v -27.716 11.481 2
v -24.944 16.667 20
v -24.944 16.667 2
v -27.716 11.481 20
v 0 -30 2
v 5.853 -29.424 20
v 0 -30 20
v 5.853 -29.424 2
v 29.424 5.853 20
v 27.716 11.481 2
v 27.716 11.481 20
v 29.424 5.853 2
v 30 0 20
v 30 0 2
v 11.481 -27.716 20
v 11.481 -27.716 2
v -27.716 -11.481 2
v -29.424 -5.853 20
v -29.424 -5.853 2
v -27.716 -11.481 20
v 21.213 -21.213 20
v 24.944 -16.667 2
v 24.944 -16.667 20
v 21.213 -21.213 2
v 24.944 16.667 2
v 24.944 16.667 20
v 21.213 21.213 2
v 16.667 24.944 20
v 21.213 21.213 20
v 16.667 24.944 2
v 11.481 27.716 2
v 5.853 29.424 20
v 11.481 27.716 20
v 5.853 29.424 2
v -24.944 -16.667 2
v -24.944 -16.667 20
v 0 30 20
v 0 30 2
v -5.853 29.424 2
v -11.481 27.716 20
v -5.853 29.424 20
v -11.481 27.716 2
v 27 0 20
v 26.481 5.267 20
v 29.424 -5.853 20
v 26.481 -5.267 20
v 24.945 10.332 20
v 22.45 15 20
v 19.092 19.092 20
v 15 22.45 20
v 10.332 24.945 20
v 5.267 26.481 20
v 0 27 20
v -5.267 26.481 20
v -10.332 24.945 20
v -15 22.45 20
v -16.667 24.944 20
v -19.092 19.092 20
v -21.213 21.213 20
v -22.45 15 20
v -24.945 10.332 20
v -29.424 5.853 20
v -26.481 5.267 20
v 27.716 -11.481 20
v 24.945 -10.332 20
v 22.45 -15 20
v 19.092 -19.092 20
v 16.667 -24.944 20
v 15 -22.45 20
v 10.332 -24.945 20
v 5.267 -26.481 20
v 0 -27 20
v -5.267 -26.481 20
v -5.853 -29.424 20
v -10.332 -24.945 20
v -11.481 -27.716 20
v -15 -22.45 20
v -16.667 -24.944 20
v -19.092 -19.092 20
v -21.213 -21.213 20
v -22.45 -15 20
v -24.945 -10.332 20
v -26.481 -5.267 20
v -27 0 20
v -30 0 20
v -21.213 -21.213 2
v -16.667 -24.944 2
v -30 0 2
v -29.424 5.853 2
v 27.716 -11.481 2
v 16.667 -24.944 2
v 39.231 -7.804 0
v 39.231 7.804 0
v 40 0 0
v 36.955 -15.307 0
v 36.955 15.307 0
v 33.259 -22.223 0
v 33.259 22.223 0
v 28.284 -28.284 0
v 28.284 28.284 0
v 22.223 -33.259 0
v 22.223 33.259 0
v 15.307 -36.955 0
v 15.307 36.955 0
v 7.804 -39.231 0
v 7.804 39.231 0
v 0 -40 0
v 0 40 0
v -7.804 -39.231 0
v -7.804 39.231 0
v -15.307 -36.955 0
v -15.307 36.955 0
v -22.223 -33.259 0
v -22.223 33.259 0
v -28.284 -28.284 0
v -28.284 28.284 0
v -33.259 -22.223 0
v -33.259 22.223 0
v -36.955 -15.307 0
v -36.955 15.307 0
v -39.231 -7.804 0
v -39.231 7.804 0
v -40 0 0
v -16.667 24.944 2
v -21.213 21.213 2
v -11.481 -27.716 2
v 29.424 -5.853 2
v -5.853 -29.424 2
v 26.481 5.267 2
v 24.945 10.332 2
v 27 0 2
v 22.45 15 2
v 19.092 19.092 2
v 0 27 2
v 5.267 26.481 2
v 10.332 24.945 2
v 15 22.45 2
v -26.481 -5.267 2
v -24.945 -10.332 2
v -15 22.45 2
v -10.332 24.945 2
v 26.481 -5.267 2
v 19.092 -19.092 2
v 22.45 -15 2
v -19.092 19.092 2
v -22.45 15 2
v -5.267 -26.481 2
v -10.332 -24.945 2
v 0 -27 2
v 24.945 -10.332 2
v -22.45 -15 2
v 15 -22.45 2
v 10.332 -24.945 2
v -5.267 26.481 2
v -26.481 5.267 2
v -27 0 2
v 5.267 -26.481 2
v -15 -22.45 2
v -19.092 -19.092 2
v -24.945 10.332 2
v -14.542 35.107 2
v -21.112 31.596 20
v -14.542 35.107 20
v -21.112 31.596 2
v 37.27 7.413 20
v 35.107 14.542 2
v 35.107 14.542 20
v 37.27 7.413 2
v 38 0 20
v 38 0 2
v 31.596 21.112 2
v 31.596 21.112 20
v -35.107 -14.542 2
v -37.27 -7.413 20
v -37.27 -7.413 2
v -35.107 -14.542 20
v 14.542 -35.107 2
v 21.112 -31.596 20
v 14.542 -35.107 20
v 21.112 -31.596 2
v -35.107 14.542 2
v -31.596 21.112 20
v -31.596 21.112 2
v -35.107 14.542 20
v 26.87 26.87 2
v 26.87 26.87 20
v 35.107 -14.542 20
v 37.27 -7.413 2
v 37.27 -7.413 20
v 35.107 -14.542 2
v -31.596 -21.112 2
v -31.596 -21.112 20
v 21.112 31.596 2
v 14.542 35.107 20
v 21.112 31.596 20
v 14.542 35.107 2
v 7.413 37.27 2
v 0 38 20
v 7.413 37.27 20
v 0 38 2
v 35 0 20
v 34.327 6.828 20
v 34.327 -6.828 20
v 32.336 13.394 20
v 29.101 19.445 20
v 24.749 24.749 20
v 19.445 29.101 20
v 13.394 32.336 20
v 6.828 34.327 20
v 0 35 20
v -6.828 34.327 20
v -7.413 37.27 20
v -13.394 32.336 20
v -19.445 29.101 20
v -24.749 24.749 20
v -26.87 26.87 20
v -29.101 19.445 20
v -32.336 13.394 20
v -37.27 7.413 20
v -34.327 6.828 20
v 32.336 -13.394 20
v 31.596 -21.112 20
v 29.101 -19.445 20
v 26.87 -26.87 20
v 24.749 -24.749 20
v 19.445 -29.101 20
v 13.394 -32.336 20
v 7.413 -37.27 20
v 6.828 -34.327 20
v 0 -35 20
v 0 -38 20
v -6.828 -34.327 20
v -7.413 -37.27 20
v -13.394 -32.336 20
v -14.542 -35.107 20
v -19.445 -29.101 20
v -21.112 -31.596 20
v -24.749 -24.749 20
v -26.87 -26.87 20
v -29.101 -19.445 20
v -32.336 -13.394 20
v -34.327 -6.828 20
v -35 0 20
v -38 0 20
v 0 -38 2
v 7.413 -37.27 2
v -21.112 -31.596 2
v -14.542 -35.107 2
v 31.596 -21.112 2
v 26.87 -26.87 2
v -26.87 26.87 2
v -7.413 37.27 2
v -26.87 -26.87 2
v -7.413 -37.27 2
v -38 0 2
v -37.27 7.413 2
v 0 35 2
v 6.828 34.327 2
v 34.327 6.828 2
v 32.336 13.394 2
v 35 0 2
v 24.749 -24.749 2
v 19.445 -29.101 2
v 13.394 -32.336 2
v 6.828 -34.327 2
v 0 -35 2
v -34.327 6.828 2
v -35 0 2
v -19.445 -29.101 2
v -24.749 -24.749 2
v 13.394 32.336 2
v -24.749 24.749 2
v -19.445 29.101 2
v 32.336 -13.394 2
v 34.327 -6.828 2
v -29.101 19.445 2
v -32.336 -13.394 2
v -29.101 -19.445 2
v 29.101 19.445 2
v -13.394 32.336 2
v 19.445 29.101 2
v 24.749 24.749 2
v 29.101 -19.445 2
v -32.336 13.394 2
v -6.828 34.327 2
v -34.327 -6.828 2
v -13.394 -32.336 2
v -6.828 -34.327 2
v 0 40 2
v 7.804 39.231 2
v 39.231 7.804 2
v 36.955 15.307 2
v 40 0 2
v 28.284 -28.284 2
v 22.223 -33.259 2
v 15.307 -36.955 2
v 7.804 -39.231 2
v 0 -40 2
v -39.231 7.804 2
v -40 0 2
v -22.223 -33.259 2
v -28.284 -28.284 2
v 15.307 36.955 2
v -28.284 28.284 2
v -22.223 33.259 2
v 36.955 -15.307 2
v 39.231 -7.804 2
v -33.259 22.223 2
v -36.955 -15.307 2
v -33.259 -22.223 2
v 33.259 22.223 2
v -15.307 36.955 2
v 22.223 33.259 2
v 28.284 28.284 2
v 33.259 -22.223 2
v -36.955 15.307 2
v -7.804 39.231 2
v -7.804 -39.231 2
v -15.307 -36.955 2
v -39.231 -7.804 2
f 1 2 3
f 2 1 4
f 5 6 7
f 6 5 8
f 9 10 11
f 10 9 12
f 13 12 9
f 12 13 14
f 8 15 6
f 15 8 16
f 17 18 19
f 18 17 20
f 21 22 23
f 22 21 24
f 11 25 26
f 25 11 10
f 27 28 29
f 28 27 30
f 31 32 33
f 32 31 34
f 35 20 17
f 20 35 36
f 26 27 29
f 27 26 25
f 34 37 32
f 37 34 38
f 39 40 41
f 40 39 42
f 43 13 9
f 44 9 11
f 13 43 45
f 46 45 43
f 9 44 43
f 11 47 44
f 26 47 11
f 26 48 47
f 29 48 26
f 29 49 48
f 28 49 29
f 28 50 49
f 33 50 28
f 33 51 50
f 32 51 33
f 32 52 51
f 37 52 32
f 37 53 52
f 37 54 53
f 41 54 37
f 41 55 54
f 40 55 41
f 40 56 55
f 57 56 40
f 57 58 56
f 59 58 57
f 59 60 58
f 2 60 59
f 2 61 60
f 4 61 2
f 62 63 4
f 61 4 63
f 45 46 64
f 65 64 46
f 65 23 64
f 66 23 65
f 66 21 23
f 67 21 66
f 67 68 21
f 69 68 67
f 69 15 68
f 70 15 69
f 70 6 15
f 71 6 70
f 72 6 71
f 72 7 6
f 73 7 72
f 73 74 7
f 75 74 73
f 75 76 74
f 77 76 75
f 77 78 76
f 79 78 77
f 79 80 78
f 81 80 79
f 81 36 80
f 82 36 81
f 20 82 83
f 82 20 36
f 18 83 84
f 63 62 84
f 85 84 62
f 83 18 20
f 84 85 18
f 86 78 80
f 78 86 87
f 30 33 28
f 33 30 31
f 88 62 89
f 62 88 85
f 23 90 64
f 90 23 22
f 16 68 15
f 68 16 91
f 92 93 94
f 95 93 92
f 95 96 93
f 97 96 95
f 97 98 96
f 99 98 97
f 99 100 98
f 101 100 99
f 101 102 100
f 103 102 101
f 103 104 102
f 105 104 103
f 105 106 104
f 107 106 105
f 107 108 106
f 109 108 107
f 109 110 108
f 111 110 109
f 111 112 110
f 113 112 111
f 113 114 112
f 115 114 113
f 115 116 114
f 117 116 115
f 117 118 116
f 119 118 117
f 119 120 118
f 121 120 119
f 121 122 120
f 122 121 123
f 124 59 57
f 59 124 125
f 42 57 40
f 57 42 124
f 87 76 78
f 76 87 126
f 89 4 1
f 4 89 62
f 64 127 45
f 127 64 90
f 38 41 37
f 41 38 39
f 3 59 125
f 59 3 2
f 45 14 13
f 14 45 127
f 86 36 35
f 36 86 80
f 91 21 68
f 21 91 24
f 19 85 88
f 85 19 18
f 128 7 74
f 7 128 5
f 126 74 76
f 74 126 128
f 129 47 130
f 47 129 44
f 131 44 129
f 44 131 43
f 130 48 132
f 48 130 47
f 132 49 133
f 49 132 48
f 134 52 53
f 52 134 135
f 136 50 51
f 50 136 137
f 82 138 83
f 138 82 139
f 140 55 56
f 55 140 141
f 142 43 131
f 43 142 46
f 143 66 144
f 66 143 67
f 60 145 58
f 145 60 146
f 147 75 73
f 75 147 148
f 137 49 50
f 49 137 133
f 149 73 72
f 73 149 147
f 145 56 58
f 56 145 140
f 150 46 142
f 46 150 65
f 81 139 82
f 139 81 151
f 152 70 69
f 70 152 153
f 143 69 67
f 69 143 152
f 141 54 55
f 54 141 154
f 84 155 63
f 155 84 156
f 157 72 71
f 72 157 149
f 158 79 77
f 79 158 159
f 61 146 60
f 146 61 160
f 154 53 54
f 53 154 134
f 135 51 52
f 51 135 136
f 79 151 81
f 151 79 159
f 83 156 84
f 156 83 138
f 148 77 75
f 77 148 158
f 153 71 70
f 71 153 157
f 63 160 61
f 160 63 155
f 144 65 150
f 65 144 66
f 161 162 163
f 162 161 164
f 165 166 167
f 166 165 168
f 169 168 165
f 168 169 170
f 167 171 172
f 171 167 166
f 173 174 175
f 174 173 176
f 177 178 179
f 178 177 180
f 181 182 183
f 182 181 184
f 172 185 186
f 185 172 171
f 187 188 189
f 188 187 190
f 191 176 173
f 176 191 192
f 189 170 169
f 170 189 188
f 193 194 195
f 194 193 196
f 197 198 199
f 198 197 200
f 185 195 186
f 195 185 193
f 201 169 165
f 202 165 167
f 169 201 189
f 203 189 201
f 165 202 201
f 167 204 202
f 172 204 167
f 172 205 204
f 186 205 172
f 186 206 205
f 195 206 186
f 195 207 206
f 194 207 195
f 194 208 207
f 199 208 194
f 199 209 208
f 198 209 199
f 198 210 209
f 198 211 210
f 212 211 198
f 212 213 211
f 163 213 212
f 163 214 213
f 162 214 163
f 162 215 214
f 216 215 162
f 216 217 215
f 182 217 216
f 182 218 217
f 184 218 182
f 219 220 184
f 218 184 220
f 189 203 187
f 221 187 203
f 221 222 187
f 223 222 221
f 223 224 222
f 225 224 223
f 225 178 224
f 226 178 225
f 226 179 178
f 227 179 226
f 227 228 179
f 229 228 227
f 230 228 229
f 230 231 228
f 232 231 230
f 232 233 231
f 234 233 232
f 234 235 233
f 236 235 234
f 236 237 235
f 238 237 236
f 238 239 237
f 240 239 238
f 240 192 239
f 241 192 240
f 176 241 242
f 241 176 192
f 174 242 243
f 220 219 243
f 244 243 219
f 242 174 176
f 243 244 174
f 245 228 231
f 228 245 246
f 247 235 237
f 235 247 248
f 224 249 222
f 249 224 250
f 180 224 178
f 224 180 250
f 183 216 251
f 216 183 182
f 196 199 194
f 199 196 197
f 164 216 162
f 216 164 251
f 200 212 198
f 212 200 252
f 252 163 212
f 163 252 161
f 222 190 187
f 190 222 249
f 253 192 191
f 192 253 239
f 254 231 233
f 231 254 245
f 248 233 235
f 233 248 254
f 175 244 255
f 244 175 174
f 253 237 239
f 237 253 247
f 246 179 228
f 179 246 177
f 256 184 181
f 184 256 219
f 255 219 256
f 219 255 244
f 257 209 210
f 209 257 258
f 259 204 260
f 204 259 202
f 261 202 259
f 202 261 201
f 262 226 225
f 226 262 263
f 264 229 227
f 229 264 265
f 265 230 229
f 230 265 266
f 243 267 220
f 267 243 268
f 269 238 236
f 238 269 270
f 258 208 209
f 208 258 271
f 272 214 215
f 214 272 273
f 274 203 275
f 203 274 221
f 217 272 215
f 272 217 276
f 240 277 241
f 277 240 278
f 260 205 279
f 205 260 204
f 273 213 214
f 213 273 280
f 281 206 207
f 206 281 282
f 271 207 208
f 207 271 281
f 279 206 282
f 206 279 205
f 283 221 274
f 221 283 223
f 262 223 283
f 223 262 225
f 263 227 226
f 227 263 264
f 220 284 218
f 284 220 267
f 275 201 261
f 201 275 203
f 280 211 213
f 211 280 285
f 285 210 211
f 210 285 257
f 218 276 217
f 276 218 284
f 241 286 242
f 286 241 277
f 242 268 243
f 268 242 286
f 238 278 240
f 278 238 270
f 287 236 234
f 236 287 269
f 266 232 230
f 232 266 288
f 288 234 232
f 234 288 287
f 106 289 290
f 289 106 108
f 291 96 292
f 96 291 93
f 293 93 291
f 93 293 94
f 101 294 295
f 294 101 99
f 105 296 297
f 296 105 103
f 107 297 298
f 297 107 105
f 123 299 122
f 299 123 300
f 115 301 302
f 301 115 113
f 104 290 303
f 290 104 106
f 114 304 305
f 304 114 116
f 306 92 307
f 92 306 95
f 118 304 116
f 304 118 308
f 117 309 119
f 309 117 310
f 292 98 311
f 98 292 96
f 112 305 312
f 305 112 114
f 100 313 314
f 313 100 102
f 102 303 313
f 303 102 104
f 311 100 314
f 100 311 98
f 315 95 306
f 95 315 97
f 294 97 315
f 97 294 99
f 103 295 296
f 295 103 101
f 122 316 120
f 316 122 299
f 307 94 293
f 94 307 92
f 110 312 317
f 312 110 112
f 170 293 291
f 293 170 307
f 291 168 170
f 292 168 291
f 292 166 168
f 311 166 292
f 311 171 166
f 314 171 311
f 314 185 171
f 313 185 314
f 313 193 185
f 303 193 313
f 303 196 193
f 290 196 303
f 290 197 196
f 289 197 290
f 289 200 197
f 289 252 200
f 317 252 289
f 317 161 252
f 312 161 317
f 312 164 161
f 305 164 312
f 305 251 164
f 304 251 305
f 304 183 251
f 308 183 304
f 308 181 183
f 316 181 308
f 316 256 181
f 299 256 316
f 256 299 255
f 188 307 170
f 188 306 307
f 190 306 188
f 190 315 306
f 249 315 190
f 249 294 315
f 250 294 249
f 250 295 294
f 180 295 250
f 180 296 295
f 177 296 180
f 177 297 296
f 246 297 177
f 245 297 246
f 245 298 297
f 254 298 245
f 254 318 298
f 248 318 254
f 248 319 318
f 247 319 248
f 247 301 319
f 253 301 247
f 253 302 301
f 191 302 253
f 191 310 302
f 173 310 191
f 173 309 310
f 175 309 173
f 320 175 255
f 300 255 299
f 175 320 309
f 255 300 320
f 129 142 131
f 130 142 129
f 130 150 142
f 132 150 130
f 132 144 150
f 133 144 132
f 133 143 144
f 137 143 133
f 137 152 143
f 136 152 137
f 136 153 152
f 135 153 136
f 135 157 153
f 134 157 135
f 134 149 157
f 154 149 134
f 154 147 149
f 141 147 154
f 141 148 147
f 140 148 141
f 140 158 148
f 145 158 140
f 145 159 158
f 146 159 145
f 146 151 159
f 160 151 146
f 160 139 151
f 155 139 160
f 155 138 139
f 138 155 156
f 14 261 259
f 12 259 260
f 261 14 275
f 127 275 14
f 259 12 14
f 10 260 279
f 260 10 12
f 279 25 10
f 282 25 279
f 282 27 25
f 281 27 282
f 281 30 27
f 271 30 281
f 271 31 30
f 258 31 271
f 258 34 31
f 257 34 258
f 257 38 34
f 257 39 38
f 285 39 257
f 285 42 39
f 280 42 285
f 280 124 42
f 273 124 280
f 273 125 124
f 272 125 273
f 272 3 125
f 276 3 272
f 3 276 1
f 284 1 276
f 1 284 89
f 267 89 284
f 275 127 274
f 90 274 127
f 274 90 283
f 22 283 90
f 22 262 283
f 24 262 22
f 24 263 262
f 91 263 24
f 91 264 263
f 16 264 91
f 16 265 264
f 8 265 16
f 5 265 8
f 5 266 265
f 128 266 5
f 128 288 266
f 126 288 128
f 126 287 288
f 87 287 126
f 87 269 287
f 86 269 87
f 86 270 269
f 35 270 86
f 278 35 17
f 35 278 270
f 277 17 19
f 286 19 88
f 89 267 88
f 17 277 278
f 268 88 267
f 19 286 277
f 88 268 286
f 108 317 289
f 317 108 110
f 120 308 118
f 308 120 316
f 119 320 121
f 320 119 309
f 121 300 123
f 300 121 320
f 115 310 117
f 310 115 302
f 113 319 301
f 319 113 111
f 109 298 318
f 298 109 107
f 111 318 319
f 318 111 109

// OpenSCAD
// Two concentric tubes on a common base. Their top faces are two annuli in the
// same plane, and the hole of the inner one (r=27) lies inside the outer bound
// of both of them.
//
// mergeTriangles() keeps the last enclosing loop it finds rather than the
// innermost, so a hole can be recorded against the face further out. The face
// it really belongs to is then written without its hole and seals the opening,
// which the CAD system shows as a membrane spanning the bore.
//
// Measured, and asserted by the driver: what the exporter has to report for
// the above to have happened. A silently faceted export is still a valid one,
// so validity alone cannot see a recogniser that has stopped recognising.
// EXPECT: 5 analytic surfaces available (5 cylindrical, 0 spherical, 0 toroidal, 0 Bezier)
// EXPECT: 5 surfaces recognised (0 toroidal, 0 spherical, 0 conical, 0 partial), 160 facets replaced
//
// The plate plus the two rings above it, the rings counted only where they
// are not already plate: pi*(1600*2 + (30^2-27^2)*18 + (38^2-35^2)*18)
// = 10220*pi.
// ROUNDTRIP: Cylinder=5 Plane=6
// VOLUME: 32107.0769197
//
// Every EXPORT-WARNING this fixture raises, named, each with why it is known;
// any other fails the test, and so does a named one no run raises any more.
//
// The repair this fixture exists for: a hole recorded against the face
// further out is moved to the face that encloses it.
// KNOWN-EXPORT-WARNING: to the enclosing face
$fn = 32;
union() {
  cylinder(h = 2, r = 40);
  difference() { cylinder(h = 20, r = 30); cylinder(h = 20, r = 27); }
  difference() { cylinder(h = 20, r = 38); cylinder(h = 20, r = 35); }
}
